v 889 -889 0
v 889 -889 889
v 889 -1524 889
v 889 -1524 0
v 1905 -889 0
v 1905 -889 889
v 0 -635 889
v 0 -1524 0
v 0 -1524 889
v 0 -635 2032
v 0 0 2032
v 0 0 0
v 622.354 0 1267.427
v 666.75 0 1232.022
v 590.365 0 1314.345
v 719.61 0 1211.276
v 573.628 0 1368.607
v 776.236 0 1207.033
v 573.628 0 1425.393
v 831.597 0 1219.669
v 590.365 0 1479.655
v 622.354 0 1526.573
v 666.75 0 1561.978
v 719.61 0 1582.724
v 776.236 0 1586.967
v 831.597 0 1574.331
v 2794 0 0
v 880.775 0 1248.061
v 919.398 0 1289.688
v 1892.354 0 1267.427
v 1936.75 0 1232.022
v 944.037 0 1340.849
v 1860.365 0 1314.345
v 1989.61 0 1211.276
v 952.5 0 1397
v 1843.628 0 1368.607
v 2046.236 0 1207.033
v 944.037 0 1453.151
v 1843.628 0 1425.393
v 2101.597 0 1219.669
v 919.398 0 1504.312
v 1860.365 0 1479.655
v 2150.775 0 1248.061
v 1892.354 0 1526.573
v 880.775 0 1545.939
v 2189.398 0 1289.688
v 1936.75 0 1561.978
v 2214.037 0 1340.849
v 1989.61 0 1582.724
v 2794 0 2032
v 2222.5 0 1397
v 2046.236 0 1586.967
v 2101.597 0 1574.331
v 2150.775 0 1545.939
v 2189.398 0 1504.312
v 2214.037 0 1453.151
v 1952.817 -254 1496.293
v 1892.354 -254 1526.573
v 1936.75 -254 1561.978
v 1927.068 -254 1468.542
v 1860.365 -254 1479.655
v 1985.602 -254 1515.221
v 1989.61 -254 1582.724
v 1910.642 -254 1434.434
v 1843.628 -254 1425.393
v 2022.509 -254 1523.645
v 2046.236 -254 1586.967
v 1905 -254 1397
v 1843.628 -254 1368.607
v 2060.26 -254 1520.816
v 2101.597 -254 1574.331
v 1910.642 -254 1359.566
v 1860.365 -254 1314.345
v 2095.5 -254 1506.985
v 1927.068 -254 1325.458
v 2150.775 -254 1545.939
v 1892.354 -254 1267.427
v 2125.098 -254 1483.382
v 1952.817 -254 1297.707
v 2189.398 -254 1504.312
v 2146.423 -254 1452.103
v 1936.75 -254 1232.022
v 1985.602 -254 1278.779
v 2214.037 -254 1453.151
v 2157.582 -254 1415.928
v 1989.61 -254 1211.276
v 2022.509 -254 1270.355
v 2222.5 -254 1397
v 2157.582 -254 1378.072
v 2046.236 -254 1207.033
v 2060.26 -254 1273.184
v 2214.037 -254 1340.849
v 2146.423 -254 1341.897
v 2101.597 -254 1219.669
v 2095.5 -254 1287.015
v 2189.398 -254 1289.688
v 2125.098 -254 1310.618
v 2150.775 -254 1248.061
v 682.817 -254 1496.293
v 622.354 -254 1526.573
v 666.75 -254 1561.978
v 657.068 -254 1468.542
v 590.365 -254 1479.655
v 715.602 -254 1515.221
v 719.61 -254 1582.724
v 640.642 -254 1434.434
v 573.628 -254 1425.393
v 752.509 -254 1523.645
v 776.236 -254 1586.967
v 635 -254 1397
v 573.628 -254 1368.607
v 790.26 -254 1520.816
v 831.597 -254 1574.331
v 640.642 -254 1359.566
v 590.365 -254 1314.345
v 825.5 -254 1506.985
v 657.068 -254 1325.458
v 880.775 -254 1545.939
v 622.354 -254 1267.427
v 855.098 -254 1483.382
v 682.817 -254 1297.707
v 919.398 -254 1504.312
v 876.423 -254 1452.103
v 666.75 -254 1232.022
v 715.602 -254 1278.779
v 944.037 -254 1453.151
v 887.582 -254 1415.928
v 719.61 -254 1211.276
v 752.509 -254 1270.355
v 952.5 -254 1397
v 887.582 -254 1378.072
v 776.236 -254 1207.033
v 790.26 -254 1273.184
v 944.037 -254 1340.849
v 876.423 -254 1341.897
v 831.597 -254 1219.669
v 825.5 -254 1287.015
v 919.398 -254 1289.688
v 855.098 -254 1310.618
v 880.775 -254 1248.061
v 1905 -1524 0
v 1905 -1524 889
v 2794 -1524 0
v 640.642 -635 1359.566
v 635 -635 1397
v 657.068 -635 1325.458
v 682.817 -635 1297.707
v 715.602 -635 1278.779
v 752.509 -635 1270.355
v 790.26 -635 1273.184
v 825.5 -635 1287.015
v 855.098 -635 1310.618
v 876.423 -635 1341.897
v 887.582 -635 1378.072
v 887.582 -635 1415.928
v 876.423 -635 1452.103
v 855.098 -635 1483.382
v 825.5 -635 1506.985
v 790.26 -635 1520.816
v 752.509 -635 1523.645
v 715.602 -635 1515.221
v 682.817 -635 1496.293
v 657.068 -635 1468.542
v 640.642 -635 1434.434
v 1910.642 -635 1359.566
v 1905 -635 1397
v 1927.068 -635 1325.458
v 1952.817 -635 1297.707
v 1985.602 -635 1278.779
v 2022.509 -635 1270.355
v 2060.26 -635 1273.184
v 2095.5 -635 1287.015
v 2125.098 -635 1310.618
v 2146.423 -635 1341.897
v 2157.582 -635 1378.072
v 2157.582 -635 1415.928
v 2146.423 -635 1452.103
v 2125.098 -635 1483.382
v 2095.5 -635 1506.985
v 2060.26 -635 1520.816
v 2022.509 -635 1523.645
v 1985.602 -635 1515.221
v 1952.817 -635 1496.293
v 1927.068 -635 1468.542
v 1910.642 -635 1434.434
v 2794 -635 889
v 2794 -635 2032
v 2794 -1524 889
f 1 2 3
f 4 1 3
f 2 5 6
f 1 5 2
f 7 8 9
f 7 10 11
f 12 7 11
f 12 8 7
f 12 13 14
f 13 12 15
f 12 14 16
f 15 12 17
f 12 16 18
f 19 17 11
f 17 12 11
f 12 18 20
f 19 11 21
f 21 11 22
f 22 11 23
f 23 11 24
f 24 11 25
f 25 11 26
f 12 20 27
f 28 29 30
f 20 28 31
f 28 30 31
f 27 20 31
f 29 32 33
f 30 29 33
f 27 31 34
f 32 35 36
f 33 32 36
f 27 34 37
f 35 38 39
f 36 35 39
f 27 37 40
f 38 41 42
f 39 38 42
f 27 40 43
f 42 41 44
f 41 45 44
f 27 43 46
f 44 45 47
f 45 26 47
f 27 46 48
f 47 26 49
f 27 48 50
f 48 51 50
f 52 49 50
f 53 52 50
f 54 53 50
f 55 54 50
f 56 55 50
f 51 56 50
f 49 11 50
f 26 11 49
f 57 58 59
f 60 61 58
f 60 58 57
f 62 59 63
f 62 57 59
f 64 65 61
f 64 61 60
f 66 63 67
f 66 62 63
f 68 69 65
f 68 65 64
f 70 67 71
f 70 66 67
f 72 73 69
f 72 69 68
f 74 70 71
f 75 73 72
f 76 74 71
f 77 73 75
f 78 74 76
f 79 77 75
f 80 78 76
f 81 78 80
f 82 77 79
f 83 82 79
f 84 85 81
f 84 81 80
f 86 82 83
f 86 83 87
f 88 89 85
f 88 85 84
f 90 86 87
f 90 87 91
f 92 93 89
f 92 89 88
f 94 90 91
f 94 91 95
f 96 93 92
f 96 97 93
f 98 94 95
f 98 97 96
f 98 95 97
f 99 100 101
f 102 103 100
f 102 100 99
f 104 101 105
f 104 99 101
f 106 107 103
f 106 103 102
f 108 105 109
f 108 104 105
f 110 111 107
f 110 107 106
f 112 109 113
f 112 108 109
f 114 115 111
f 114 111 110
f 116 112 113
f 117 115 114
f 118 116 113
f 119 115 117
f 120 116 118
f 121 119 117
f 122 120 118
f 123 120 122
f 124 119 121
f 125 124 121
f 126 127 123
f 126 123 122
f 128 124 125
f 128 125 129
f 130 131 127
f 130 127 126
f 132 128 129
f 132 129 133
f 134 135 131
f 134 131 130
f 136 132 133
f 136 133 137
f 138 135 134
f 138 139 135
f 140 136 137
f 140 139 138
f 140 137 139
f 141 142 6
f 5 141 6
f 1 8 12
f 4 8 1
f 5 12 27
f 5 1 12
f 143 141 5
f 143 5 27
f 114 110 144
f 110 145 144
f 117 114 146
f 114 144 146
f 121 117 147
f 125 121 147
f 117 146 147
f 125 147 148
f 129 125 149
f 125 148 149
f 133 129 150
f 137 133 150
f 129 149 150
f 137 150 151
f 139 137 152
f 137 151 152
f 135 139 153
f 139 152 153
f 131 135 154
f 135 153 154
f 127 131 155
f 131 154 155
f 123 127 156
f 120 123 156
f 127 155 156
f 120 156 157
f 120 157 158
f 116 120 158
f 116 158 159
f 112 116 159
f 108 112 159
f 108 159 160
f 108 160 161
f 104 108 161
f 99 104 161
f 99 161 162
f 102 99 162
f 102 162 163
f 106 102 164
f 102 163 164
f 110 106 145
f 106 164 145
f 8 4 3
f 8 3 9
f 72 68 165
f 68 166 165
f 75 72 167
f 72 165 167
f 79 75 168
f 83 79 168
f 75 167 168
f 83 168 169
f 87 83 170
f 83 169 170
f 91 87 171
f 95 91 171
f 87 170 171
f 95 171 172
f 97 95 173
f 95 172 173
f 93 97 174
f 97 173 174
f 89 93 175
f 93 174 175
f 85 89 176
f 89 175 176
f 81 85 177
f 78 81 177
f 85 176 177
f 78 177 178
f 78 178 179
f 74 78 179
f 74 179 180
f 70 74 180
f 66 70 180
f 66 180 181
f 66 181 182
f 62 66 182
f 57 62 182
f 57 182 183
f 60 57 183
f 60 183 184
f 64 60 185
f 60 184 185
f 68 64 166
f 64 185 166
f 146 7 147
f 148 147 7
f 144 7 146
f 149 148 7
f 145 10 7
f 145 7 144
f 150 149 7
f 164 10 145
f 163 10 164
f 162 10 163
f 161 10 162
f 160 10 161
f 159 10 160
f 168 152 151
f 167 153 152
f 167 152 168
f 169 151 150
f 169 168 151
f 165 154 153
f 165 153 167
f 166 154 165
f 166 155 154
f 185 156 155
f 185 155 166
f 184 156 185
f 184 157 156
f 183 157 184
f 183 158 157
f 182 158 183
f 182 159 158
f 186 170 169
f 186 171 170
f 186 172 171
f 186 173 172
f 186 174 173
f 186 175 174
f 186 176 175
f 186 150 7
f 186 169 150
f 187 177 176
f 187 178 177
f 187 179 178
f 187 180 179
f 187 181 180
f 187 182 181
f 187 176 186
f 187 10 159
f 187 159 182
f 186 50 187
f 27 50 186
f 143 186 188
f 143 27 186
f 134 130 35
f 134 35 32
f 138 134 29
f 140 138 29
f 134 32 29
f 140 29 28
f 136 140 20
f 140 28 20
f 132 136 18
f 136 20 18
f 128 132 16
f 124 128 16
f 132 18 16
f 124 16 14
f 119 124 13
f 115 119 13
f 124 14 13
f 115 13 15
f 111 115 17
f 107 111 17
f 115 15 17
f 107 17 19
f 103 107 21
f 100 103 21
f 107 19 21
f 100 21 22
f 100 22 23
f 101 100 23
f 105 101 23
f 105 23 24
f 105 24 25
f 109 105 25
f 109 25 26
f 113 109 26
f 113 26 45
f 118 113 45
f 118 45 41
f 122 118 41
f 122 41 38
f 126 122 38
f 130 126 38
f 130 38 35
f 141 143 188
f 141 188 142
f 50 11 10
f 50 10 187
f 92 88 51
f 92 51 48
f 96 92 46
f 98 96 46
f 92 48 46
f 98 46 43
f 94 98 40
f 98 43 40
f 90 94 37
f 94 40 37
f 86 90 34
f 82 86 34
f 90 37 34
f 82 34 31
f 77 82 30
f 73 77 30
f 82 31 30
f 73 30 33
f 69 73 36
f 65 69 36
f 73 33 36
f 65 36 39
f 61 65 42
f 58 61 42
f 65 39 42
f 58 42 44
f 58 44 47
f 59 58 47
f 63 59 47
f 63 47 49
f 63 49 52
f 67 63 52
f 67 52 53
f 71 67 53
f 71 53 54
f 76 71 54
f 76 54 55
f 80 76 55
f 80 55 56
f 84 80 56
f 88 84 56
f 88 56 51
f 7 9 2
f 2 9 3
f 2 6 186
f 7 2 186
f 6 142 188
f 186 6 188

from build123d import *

# Parameters (mm, degrees)
F0_W           = 2794
F0_H           = 2032
F0_R           = 127
F1_DEPTH       = 635
F2_D           = 254
F2_CBORE_D     = 381
F2_CBORE_DEPTH = 254
F4_DEPTH       = 889


with BuildPart() as f1:
    # F0 (on Front) → F1 (new body)
    with BuildSketch(Plane.XZ):
        with Locations((1397, 1016)):
            Rectangle(F0_W, F0_H)
        with Locations((762, 1397)):
            Circle(F0_R, mode=Mode.SUBTRACT)
        with Locations((2032, 1397)):
            Circle(F0_R, mode=Mode.SUBTRACT)
        with Locations((762, 1397)):
            Circle(F0_R)
        with Locations((2032, 1397)):
            Circle(F0_R)
    extrude(amount=F1_DEPTH)

    # F2 (through all)
    with Locations(Plane(origin=(0, 0, 0), x_dir=(1, 0, 0), z_dir=(0, 1, 0))):
        with Locations((2032, -1397), (762, -1397)):
            CounterBoreHole(F2_D / 2, F2_CBORE_D / 2, F2_CBORE_DEPTH)

    # F3 (on face) → F4 (join)
    with BuildSketch(Plane(origin=(0, 0, 0), x_dir=(1, 0, 0), z_dir=(0, 0, -1))):
        Polygon((0, 1524), (0, 635), (2794, 635), (2794, 1524), (1905, 1524), (1905, 889), (889, 889), (889, 1524), align=None)
    extrude(amount=-F4_DEPTH)


solid = f1.part
